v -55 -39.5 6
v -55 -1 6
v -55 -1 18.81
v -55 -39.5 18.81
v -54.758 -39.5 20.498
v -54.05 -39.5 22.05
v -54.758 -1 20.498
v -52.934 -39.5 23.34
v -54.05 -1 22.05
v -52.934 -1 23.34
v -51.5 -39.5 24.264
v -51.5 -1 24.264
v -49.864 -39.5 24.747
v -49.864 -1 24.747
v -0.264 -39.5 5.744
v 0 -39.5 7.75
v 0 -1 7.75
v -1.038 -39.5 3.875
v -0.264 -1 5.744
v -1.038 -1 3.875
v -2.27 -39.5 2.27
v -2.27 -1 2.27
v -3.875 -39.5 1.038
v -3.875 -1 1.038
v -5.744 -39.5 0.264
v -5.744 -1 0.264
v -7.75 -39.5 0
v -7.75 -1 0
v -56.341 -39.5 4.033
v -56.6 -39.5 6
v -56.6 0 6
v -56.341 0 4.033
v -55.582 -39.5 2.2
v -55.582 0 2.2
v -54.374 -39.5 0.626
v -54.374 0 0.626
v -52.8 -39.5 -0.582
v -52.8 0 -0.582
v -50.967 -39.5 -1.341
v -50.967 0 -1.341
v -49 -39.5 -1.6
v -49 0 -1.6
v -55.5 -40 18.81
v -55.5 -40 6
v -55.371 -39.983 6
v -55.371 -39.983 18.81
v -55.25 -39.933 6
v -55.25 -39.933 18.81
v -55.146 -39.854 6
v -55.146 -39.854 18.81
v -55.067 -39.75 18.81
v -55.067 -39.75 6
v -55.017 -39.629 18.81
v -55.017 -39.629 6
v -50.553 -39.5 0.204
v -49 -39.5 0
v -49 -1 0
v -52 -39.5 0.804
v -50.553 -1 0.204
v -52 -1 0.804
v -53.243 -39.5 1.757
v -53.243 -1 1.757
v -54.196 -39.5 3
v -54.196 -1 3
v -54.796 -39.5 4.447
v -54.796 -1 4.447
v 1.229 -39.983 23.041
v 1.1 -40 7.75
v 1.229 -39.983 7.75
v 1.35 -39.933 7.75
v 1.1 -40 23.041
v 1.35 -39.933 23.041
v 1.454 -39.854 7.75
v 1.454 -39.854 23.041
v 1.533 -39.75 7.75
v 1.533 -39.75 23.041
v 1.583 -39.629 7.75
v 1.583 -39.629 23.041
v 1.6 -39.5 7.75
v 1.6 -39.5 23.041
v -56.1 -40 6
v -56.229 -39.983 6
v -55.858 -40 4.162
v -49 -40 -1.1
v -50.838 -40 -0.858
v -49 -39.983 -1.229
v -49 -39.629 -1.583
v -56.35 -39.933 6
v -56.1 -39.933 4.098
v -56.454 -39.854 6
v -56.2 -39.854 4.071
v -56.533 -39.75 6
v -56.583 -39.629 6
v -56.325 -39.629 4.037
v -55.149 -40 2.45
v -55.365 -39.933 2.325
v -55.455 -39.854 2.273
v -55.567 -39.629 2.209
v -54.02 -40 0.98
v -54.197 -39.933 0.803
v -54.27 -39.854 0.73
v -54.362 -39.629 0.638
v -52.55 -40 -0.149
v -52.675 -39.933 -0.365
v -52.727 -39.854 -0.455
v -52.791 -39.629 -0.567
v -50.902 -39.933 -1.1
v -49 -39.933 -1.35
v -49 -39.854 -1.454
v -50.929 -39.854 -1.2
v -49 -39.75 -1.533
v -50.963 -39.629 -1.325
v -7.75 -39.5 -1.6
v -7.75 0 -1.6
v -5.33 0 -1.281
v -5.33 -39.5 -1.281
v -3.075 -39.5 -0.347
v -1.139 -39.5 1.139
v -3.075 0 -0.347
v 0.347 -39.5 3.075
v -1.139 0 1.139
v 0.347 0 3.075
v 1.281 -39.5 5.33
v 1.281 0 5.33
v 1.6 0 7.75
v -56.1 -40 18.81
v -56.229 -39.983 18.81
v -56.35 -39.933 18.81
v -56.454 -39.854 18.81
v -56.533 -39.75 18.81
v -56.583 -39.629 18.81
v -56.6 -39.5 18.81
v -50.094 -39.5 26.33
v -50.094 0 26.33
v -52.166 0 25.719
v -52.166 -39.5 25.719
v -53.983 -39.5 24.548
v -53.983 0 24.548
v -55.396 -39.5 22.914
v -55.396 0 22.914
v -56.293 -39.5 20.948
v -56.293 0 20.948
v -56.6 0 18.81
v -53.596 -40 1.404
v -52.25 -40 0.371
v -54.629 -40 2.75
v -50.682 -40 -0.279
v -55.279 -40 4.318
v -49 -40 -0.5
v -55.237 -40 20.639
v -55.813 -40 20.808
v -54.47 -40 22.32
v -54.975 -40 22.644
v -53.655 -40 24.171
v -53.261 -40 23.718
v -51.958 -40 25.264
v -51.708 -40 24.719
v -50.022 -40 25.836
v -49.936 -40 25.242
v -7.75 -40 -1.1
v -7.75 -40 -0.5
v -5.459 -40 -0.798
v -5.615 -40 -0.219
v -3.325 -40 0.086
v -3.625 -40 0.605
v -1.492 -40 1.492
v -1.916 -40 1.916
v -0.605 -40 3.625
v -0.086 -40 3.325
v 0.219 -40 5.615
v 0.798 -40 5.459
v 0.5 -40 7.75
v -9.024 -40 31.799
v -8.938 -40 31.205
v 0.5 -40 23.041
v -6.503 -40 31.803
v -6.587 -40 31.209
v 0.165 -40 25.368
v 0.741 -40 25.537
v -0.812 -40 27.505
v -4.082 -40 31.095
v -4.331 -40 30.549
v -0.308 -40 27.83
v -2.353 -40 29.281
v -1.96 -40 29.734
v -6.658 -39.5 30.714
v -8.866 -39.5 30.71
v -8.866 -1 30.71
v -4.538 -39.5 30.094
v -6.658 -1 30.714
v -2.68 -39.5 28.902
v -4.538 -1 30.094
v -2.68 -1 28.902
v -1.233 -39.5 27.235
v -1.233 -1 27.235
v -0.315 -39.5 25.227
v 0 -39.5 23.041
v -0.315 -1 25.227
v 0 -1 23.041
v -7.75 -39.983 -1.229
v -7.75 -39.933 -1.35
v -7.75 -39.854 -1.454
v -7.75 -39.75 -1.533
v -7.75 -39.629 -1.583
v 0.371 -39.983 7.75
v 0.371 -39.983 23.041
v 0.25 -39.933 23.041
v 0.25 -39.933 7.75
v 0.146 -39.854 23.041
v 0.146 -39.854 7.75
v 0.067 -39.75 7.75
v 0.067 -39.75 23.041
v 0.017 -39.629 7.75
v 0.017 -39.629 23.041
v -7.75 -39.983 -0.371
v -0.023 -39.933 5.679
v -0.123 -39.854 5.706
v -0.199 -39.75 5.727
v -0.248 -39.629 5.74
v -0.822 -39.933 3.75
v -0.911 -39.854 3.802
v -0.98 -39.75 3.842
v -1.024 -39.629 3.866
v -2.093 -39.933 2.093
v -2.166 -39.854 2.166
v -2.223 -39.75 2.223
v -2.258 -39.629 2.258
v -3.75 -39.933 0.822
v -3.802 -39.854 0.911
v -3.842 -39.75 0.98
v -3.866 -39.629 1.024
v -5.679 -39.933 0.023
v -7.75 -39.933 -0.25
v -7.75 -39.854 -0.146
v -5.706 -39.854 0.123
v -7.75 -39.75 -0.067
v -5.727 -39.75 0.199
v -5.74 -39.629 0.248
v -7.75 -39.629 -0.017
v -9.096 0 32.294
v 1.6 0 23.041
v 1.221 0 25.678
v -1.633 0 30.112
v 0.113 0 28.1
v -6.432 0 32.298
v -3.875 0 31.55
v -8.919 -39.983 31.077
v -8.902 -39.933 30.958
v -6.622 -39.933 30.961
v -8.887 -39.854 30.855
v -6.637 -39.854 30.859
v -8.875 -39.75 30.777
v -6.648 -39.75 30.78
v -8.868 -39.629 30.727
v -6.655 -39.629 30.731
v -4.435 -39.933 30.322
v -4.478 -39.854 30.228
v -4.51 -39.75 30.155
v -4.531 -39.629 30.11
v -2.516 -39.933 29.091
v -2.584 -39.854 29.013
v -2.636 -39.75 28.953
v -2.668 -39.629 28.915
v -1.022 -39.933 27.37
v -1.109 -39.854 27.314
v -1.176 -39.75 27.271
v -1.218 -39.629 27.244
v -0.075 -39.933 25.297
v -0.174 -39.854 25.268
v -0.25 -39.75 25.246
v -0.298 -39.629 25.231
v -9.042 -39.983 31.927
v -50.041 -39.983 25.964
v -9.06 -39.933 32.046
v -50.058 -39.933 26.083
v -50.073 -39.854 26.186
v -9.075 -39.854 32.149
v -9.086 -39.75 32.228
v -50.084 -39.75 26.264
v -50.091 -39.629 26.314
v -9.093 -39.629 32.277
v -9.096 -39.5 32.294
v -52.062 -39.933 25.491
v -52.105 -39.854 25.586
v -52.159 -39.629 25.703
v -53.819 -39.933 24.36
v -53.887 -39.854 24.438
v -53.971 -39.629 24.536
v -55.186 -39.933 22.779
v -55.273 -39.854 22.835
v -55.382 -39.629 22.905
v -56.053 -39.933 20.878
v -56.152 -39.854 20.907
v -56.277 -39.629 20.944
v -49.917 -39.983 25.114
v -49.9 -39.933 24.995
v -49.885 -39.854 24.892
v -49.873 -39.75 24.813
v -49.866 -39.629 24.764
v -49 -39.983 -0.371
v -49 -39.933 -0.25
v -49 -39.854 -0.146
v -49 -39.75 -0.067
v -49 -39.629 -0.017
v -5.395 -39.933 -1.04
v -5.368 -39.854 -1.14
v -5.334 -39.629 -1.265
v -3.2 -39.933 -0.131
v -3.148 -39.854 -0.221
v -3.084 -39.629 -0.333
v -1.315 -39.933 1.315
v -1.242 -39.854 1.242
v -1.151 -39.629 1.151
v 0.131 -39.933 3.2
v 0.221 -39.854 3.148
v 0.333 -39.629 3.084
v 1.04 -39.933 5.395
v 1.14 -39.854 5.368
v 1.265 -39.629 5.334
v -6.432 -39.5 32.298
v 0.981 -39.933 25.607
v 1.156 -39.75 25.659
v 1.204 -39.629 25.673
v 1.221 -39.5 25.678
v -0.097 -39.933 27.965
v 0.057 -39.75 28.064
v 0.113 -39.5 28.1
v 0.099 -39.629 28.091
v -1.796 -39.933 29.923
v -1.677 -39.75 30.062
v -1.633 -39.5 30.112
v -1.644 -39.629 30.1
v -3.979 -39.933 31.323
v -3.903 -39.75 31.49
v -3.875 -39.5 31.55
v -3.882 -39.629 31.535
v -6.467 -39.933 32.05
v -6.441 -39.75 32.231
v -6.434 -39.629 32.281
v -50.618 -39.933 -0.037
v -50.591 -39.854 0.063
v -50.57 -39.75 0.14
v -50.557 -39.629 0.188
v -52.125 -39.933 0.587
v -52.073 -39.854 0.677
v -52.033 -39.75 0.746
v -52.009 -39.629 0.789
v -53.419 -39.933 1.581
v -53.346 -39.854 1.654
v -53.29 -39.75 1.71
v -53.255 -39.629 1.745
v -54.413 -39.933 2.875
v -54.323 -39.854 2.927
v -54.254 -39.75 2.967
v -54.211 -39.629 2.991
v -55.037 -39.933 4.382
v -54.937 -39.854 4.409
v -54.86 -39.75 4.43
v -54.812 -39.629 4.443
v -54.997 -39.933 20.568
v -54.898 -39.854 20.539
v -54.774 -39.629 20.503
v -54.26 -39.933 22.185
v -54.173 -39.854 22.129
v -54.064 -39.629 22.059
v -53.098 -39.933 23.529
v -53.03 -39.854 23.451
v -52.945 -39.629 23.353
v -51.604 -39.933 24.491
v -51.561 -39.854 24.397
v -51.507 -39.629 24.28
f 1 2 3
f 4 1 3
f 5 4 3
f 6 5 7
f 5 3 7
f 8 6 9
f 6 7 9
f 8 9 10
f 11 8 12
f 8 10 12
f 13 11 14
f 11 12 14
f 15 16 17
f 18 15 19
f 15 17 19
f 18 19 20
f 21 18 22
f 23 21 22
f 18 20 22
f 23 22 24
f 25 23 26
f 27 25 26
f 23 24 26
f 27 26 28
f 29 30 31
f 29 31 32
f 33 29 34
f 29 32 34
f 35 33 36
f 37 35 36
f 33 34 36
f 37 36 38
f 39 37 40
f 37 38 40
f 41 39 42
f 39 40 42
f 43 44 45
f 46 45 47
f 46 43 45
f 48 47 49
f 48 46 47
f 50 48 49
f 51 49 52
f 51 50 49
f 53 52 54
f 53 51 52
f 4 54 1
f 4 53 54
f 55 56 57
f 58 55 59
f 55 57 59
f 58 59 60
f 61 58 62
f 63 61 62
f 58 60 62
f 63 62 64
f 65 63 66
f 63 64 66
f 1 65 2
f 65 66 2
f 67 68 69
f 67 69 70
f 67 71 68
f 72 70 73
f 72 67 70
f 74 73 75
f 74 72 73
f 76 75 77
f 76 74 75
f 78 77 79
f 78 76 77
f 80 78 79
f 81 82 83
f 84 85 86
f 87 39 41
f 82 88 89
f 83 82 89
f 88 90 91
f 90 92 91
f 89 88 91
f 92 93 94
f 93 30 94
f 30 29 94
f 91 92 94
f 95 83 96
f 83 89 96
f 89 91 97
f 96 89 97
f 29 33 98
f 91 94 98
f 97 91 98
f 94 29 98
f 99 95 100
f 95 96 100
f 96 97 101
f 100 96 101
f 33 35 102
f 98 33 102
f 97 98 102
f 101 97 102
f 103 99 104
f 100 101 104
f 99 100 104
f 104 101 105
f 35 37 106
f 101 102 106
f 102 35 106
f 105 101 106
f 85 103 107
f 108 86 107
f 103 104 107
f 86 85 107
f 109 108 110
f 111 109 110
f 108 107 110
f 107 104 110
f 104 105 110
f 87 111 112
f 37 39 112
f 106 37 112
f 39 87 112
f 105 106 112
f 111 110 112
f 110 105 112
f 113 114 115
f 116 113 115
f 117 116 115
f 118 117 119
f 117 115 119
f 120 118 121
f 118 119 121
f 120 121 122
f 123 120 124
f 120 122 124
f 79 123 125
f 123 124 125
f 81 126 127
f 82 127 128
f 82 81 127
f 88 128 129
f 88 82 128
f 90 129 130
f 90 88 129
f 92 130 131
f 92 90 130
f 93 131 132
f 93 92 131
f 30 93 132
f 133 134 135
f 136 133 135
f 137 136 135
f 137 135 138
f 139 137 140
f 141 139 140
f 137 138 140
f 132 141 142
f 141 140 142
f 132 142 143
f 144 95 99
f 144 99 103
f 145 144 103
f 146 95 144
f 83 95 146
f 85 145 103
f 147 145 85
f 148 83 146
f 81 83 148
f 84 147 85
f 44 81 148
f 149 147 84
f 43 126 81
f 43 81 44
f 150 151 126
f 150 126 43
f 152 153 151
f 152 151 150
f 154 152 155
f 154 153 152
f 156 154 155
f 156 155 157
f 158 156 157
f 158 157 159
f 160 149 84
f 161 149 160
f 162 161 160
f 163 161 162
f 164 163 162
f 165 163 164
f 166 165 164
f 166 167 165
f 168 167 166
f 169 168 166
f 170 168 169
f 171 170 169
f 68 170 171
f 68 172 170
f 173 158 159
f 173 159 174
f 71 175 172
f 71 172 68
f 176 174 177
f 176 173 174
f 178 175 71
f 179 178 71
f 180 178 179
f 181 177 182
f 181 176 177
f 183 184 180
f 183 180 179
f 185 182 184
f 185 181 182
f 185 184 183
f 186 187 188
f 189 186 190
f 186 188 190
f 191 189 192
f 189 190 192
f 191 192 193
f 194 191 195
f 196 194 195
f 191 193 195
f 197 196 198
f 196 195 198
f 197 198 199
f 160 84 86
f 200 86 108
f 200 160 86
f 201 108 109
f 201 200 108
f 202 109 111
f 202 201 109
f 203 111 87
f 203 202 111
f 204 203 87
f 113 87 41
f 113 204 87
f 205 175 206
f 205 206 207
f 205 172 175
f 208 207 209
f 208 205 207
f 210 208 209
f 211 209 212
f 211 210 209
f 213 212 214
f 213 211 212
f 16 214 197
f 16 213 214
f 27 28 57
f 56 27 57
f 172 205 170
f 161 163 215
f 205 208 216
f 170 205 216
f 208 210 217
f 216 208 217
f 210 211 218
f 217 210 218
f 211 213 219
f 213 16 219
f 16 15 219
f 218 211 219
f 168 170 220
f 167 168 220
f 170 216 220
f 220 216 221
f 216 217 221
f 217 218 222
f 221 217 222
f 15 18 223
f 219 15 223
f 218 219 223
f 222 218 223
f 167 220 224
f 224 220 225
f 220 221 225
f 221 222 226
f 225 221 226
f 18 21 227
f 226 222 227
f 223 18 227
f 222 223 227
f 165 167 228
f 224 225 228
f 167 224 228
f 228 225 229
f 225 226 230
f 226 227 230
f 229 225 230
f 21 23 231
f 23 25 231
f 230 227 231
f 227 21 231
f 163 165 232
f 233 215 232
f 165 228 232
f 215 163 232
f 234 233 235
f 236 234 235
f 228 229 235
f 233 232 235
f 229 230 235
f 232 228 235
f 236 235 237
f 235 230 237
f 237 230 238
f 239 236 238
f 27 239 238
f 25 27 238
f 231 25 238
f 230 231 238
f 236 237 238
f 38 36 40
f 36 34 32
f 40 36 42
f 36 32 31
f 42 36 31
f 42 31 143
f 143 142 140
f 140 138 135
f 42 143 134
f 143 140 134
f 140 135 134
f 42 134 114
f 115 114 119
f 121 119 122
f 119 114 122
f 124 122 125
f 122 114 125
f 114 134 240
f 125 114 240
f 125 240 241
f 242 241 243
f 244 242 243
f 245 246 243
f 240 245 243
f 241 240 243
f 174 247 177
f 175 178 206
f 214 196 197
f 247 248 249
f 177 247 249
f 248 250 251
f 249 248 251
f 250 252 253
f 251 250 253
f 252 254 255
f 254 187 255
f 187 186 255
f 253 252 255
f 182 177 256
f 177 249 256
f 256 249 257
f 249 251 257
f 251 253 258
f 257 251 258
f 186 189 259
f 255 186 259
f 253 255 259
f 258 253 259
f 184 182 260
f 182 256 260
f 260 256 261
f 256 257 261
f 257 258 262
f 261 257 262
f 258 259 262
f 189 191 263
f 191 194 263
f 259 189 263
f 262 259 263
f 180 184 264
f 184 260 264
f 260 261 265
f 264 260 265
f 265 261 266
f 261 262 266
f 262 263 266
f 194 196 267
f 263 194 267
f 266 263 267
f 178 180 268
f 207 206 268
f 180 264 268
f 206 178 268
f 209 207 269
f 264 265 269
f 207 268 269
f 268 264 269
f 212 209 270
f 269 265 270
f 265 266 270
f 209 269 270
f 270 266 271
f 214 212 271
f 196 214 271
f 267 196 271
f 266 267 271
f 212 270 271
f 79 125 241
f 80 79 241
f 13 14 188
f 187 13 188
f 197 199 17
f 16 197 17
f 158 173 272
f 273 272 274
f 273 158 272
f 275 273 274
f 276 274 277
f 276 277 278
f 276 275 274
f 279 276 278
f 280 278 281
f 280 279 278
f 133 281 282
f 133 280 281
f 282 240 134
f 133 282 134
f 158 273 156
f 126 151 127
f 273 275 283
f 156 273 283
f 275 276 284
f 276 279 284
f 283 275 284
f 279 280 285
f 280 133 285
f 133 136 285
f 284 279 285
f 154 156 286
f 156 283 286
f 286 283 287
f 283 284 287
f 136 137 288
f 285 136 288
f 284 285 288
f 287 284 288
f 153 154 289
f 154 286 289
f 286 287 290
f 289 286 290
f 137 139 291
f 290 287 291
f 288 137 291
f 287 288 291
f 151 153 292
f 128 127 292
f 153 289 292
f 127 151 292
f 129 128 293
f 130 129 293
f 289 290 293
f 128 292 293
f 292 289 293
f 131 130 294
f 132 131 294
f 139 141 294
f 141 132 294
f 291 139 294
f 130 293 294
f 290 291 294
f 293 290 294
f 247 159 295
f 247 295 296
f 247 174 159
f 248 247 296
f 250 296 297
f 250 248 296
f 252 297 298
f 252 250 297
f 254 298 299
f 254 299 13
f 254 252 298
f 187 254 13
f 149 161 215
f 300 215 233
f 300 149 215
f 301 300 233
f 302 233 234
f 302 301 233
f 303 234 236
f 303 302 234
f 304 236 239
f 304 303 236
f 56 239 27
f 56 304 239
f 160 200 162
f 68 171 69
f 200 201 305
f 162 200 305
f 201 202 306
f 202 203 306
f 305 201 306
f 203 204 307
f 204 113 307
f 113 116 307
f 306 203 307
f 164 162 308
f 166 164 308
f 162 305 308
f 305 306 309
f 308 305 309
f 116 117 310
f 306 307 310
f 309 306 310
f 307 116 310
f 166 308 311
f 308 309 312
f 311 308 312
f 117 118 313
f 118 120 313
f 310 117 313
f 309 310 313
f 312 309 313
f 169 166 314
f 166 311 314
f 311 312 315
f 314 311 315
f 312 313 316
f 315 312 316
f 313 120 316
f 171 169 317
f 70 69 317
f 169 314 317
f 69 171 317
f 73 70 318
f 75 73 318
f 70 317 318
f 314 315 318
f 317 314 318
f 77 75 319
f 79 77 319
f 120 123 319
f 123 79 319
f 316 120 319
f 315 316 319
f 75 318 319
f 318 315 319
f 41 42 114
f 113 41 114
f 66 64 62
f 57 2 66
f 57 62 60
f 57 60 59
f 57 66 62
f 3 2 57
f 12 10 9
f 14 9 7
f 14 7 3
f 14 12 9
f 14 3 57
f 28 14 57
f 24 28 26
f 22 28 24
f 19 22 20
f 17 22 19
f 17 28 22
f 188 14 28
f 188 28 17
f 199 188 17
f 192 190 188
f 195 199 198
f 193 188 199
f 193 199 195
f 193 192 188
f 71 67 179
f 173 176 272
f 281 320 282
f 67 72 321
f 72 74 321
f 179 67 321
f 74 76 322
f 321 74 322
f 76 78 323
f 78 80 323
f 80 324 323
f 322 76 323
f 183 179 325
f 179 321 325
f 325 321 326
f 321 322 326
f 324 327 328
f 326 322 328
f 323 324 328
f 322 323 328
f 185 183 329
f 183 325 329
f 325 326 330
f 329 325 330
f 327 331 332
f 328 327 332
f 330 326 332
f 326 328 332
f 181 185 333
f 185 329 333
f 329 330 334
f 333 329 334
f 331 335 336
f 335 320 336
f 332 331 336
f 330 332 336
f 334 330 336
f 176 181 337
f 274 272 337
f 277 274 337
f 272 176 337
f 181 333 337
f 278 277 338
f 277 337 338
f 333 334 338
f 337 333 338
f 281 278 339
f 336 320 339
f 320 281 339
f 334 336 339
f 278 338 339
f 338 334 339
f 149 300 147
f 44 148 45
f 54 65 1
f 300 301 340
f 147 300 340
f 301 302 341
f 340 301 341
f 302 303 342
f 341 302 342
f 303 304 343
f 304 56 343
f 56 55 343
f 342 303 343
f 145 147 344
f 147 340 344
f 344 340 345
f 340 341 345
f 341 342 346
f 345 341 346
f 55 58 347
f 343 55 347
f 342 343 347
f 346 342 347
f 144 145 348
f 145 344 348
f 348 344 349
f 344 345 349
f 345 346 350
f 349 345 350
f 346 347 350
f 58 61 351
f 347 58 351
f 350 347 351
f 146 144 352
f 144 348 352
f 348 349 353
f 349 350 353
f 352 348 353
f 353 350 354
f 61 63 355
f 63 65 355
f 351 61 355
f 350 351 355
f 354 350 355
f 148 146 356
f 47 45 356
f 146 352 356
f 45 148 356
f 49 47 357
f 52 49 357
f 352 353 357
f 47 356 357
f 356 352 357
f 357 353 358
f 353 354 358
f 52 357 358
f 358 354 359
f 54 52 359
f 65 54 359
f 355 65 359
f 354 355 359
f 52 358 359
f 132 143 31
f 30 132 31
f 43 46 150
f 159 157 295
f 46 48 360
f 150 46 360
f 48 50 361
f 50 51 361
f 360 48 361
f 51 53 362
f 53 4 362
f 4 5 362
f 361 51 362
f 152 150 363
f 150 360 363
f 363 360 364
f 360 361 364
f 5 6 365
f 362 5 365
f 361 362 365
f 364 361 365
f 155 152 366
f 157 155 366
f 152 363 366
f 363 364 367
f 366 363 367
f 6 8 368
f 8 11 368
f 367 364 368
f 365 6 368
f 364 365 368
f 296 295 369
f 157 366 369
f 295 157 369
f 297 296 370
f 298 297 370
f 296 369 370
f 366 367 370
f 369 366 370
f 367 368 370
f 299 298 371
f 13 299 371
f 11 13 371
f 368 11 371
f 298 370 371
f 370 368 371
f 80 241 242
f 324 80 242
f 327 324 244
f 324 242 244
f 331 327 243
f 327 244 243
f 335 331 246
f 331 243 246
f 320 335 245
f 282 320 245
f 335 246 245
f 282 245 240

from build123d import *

# Parameters (mm, degrees)
F1_DEPTH = 1
F2_DEPTH = 40
F3_R     = 0.5


with BuildPart() as f1:
    # F0 (on Front) → F1 (new body)
    with BuildSketch(Plane.XZ):
        with BuildLine():
            ThreePointArc((-7.75, 0), (-2.269922, 2.269922), (0, 7.75))
            Line((0, 7.75), (0, 23.041173))
            ThreePointArc((0, 23.041173), (-2.679639, 28.902397), (-8.865534, 30.710468))
            Line((-8.865534, 30.710468), (-49.863639, 24.747107))
            ThreePointArc((-49.863639, 24.747107), (-53.537722, 22.735029), (-55, 18.809588))
            Line((-55, 18.809588), (-55, 6))
            ThreePointArc((-55, 6), (-53.242641, 1.757359), (-49, 0))
            Line((-49, 0), (-7.75, 0))
        make_face()
    extrude(amount=F1_DEPTH)

    # F0 (on Front) → F2 (join)
    with BuildSketch(Plane.XZ):
        with BuildLine():
            Line((-49, -1.6), (-7.75, -1.6))
            ThreePointArc((-7.75, -1.6), (-1.138552, 1.138552), (1.6, 7.75))
            Line((1.6, 7.75), (1.6, 23.041173))
            ThreePointArc((1.6, 23.041173), (-1.632855, 30.112456), (-9.095838, 32.293806))
            Line((-9.095838, 32.293806), (-50.093943, 26.330445))
            ThreePointArc((-50.093943, 26.330445), (-54.747781, 23.781813), (-56.6, 18.809588))
            Line((-56.6, 18.809588), (-56.6, 6))
            ThreePointArc((-56.6, 6), (-54.374012, 0.625988), (-49, -1.6))
        make_face()
        with BuildLine():
            Line((0, 23.041173), (0, 7.75))
            ThreePointArc((0, 7.75), (-2.269922, 2.269922), (-7.75, 0))
            Line((-7.75, 0), (-49, 0))
            ThreePointArc((-49, 0), (-53.242641, 1.757359), (-55, 6))
            Line((-55, 6), (-55, 18.809588))
            ThreePointArc((-55, 18.809588), (-53.537722, 22.735029), (-49.863639, 24.747107))
            Line((-49.863639, 24.747107), (-8.865534, 30.710468))
            ThreePointArc((-8.865534, 30.710468), (-2.679639, 28.902397), (0, 23.041173))
        make_face(mode=Mode.SUBTRACT)
    extrude(amount=F2_DEPTH)

    # F3
    f3_edges = [f1.edges().sort_by_distance(p)[0] for p in [
        (-29.59489, -40, 29.312126),
        (-29.364586, -40, 27.728787),
    ]]
    fillet(f3_edges, radius=F3_R)


solid = f1.part
